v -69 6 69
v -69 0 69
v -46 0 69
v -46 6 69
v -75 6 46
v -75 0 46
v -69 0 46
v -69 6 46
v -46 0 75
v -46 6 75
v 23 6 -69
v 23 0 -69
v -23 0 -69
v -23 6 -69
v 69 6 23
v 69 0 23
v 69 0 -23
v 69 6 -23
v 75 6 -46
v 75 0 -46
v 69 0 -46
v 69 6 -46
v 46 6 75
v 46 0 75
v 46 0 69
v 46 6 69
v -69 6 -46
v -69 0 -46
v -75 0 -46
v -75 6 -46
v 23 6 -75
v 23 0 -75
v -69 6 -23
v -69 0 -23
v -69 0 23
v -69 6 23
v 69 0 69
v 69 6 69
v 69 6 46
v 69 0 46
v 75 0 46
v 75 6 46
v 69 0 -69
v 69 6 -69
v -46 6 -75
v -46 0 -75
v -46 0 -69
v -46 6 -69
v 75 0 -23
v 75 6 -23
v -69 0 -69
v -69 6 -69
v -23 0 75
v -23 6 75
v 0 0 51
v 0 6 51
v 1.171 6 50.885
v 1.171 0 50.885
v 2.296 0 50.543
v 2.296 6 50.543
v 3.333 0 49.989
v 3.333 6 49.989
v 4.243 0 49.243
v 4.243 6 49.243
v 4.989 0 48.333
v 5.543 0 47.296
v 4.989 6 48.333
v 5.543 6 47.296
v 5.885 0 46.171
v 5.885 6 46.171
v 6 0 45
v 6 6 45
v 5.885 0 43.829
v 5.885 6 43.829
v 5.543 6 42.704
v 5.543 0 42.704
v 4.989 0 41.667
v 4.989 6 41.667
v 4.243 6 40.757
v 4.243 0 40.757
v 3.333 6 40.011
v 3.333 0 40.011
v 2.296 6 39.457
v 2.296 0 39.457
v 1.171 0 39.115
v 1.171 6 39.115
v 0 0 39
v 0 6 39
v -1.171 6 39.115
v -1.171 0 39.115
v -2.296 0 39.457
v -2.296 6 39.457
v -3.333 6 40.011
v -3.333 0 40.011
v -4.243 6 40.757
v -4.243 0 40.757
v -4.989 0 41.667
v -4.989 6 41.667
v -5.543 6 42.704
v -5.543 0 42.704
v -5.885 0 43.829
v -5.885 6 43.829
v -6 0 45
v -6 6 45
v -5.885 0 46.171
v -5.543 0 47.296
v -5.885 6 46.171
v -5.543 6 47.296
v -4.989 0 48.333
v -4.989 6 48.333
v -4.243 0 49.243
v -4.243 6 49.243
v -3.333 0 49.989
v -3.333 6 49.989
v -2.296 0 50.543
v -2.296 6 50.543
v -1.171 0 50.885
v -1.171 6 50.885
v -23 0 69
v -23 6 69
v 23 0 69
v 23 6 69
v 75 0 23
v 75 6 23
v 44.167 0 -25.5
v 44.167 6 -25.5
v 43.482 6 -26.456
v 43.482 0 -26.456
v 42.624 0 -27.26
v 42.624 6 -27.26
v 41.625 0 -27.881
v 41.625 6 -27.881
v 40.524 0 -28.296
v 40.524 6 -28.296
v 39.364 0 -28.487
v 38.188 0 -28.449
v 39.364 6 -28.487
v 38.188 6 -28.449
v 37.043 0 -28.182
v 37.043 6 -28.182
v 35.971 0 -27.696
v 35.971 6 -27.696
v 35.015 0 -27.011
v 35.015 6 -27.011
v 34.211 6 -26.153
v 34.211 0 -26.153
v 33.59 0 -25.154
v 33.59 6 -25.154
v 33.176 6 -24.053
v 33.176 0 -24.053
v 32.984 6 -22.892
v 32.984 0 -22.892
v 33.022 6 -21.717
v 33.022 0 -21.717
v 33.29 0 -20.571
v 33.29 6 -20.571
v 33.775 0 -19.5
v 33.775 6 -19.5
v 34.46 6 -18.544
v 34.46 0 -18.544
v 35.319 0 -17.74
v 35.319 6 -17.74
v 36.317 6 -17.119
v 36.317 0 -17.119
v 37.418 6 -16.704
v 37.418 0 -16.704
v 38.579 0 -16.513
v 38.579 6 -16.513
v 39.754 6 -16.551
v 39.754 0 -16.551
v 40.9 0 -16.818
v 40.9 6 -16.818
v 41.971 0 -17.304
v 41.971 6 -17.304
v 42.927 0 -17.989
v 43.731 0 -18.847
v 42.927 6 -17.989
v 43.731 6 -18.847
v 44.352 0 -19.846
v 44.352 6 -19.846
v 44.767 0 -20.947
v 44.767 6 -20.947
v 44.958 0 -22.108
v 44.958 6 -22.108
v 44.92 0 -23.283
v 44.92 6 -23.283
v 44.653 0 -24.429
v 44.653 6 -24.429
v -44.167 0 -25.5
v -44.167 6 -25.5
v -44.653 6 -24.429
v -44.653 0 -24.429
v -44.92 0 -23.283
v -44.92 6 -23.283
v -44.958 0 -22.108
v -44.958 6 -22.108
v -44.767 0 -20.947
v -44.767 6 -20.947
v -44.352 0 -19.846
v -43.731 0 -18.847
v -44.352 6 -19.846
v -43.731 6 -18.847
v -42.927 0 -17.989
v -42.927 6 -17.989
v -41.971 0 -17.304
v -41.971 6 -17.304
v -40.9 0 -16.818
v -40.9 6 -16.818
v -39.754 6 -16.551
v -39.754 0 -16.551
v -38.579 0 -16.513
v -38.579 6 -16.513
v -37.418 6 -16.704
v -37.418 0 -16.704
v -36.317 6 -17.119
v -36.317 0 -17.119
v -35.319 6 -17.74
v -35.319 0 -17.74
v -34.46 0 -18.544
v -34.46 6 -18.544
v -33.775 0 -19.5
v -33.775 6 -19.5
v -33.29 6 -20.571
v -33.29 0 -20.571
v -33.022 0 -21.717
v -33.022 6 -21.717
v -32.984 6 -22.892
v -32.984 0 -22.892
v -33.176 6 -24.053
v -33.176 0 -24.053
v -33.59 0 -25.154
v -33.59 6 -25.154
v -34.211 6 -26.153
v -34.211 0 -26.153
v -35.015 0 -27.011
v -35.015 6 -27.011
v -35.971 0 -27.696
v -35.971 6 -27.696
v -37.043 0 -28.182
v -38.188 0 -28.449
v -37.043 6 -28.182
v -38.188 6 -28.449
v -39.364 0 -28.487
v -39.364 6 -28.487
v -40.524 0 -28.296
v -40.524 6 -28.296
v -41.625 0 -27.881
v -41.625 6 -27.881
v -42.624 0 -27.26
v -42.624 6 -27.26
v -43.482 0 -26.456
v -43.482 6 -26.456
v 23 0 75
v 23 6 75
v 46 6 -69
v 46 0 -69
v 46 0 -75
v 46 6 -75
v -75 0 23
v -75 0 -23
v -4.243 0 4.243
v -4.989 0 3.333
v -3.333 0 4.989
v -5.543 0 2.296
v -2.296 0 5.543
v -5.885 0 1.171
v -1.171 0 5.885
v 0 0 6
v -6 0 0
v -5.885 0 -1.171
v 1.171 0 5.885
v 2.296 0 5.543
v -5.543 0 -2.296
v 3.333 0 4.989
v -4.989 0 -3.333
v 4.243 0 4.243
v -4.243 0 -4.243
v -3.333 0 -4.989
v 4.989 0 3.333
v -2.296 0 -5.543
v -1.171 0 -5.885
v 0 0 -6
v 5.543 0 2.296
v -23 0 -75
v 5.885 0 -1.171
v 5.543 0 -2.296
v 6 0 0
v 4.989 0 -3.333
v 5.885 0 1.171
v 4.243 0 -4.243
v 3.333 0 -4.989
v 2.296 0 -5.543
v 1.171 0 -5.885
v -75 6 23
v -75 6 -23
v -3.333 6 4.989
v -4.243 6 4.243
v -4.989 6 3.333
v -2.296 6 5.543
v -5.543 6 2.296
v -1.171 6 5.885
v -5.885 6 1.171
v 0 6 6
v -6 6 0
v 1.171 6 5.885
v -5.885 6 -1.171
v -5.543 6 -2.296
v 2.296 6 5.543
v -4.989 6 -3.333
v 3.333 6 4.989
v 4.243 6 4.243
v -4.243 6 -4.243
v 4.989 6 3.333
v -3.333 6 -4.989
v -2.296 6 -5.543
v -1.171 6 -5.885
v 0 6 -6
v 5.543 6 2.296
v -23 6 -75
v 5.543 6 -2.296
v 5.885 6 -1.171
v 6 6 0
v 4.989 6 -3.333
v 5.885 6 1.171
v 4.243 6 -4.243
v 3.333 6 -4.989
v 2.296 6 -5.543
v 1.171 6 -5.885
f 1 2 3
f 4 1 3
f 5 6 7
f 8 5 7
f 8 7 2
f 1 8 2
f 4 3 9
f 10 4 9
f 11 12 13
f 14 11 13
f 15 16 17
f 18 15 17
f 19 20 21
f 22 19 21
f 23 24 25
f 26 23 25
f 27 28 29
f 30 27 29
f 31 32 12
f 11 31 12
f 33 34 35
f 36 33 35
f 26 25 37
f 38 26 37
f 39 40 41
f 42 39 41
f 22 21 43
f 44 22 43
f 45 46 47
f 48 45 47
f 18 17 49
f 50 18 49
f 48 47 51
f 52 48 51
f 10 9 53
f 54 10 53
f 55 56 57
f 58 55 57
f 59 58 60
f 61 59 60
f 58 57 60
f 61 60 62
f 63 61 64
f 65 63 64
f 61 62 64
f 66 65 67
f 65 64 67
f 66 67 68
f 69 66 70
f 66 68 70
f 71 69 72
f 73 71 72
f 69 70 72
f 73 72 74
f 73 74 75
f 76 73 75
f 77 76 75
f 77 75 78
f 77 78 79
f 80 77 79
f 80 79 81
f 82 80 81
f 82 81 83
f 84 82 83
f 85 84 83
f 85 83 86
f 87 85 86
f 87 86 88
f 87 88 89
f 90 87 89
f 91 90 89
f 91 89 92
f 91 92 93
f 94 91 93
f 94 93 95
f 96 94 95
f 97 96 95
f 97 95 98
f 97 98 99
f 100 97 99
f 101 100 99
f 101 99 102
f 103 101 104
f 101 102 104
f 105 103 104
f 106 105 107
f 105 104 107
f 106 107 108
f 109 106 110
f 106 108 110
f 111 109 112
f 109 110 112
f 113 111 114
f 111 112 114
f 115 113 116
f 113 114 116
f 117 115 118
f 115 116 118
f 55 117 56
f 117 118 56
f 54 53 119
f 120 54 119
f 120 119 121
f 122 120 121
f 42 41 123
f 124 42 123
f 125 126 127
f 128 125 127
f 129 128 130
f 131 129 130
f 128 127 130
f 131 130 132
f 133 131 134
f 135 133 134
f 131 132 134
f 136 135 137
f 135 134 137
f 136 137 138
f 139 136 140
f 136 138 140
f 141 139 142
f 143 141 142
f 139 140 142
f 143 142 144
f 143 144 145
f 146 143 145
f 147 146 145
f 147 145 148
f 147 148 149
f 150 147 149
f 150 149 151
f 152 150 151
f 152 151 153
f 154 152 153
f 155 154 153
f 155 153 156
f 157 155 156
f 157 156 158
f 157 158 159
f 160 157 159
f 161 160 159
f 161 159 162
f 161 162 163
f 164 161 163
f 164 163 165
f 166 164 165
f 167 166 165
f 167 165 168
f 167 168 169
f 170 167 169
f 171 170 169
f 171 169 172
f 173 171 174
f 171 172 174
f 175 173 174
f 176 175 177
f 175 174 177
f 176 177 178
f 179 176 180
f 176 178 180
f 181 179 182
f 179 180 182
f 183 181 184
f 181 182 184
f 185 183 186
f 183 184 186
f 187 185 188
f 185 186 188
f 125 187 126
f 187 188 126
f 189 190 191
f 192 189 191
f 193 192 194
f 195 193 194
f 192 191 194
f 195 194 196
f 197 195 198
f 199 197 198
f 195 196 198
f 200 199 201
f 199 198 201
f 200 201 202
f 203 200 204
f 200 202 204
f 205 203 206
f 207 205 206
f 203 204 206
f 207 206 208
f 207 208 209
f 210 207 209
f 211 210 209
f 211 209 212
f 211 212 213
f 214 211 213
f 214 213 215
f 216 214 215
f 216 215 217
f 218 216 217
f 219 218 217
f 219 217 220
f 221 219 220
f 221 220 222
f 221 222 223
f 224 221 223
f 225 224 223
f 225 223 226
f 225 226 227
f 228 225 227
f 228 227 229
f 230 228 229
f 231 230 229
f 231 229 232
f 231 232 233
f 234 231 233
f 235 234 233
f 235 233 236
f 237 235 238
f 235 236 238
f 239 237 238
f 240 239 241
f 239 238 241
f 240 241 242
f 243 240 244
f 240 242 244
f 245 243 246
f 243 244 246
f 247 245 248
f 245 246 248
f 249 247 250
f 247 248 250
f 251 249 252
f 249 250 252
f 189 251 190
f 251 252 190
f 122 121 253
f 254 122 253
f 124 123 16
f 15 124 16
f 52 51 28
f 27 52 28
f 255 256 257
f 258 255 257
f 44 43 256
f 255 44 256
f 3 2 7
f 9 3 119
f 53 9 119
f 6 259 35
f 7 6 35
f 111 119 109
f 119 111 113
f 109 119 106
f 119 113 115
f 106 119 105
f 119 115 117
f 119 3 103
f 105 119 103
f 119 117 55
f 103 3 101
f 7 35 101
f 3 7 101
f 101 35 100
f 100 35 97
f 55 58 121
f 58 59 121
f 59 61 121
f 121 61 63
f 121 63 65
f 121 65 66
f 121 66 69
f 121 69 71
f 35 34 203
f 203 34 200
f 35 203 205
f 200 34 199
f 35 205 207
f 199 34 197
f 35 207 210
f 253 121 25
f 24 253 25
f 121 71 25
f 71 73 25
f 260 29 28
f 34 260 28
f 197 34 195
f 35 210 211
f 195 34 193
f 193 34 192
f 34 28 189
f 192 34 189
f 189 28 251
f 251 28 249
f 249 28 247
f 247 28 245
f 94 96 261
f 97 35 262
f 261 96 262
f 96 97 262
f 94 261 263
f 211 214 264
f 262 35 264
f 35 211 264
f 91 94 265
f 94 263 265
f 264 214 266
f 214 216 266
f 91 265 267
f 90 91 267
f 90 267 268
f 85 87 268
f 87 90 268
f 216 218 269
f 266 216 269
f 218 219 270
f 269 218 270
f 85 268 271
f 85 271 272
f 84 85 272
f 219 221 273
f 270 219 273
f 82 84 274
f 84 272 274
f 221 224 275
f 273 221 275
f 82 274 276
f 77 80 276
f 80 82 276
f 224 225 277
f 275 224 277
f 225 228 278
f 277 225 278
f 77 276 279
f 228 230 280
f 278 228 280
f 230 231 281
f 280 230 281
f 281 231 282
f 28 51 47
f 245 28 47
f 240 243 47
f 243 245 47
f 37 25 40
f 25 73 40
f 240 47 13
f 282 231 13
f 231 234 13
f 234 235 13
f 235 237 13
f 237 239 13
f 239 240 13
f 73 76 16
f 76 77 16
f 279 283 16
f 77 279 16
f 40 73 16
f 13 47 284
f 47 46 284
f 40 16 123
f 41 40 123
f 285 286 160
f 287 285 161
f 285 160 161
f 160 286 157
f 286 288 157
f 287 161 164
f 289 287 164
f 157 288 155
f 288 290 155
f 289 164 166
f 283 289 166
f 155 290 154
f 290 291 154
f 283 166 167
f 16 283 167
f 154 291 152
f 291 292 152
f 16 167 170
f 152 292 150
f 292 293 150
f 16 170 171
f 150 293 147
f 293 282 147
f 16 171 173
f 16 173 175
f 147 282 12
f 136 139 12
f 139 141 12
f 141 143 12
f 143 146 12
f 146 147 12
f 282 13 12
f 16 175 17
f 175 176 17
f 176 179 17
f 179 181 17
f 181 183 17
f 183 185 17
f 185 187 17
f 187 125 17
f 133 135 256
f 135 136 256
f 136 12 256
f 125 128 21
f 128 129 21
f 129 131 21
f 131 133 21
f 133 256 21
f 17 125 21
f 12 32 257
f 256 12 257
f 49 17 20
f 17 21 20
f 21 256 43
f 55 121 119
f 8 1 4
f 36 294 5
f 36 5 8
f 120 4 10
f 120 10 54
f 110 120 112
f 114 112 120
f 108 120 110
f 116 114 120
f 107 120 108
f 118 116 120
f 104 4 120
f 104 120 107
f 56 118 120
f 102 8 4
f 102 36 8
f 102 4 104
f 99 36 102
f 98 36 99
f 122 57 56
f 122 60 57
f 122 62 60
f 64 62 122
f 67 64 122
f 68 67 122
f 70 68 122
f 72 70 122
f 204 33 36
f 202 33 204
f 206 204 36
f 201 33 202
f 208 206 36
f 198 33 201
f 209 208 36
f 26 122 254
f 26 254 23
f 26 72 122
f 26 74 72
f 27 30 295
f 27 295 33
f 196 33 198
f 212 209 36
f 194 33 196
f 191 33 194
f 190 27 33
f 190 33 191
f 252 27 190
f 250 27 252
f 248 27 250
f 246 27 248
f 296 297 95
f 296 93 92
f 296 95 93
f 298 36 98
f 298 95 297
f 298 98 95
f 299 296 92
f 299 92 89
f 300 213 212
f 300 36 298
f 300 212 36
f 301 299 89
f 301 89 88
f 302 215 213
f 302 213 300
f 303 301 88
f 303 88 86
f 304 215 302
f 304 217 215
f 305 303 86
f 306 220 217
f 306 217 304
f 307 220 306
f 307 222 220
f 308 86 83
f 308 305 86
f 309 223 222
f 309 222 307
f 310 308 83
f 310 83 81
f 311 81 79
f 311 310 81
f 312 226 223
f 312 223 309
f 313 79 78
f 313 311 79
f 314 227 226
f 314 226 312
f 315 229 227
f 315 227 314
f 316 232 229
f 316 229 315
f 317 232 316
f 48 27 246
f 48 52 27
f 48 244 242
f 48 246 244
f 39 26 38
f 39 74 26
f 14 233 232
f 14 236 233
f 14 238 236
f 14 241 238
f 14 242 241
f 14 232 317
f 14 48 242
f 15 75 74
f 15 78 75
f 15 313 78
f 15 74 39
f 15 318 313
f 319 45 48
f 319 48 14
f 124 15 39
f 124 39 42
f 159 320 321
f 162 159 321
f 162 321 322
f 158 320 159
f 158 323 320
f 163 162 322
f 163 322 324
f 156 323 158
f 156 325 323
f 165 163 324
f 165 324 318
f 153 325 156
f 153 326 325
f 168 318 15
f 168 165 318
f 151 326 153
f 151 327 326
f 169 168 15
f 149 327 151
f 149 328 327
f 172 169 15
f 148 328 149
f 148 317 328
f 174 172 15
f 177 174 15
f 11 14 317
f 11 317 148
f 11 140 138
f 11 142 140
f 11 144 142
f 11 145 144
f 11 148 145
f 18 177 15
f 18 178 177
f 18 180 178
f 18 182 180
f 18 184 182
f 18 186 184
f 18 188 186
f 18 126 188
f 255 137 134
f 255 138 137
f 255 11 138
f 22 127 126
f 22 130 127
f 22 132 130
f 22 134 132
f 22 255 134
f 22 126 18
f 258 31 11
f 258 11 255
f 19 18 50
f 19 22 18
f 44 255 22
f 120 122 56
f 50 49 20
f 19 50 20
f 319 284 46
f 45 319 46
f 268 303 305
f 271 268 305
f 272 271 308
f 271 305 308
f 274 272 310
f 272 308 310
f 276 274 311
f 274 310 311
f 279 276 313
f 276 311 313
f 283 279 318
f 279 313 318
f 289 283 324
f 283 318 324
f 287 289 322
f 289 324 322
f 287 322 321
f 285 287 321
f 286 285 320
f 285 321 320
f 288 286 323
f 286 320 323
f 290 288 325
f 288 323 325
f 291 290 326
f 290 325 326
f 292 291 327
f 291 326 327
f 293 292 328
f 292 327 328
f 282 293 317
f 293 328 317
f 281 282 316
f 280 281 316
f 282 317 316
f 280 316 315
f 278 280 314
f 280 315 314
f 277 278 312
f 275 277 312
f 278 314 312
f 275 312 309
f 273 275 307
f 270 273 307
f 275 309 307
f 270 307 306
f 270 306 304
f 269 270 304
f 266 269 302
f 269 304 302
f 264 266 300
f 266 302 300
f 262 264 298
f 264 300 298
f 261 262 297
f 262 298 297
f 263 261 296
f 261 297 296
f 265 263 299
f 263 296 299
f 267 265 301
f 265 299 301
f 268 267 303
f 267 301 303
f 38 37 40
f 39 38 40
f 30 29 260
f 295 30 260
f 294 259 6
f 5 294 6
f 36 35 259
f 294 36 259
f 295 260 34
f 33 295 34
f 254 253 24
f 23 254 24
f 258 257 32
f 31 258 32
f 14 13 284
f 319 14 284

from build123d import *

# Parameters (mm, degrees)
BOSS_EXTRUDE1_DEPTH = 6
SKETCH2_R           = 6
CUT_EXTRUDE1_DEPTH  = 107.235587258
CIRPATTERN1_COUNT   = 3


with BuildPart() as part:
    # Sketch1 → Boss-Extrude1 (new body)
    with BuildSketch(Plane(origin=(0, 0, 0), x_dir=(1, 0, 0), z_dir=(0, 1, 0))):
        Polygon((0, 69), (-23, 69), (-23, 75), (-46, 75), (-46, 69), (-69, 69), (-69, 46), (-75, 46), (-75, 23), (-69, 23), (-69, 0), (-69, -23), (-75, -23), (-75, -46), (-69, -46), (-69, -69), (-46, -69), (-46, -75), (-23, -75), (-23, -69), (0, -69), (23, -69), (23, -75), (46, -75), (46, -69), (69, -69), (69, -46), (75, -46), (75, -23), (69, -23), (69, 0), (69, 23), (75, 23), (75, 46), (69, 46), (69, 69), (46, 69), (46, 75), (23, 75), (23, 69), align=None)
    extrude(amount=BOSS_EXTRUDE1_DEPTH)

    # Sketch2 → Cut-Extrude1 (cut, through all)
    with BuildSketch(Plane(origin=(0, 6, 0), x_dir=(1, 0, 0), z_dir=(0, 1, 0))):
        with Locations(Location((0, 0, 0), (0, 0, 270))):
            Circle(SKETCH2_R)
        with Locations(Location((0, -45, 0), (0, 0, 270))):
            Circle(SKETCH2_R)
    cut_extrude1 = extrude(amount=-CUT_EXTRUDE1_DEPTH, mode=Mode.SUBTRACT)

    # CirPattern1: Cut-Extrude1 ×3 about axis
    cirpattern1_axis = Axis((0, 0, 0), (0, 1, 0))
    for i in range(1, CIRPATTERN1_COUNT):
        add(cut_extrude1.rotate(cirpattern1_axis, i * 360 / CIRPATTERN1_COUNT), mode=Mode.SUBTRACT)


solid = part.part
